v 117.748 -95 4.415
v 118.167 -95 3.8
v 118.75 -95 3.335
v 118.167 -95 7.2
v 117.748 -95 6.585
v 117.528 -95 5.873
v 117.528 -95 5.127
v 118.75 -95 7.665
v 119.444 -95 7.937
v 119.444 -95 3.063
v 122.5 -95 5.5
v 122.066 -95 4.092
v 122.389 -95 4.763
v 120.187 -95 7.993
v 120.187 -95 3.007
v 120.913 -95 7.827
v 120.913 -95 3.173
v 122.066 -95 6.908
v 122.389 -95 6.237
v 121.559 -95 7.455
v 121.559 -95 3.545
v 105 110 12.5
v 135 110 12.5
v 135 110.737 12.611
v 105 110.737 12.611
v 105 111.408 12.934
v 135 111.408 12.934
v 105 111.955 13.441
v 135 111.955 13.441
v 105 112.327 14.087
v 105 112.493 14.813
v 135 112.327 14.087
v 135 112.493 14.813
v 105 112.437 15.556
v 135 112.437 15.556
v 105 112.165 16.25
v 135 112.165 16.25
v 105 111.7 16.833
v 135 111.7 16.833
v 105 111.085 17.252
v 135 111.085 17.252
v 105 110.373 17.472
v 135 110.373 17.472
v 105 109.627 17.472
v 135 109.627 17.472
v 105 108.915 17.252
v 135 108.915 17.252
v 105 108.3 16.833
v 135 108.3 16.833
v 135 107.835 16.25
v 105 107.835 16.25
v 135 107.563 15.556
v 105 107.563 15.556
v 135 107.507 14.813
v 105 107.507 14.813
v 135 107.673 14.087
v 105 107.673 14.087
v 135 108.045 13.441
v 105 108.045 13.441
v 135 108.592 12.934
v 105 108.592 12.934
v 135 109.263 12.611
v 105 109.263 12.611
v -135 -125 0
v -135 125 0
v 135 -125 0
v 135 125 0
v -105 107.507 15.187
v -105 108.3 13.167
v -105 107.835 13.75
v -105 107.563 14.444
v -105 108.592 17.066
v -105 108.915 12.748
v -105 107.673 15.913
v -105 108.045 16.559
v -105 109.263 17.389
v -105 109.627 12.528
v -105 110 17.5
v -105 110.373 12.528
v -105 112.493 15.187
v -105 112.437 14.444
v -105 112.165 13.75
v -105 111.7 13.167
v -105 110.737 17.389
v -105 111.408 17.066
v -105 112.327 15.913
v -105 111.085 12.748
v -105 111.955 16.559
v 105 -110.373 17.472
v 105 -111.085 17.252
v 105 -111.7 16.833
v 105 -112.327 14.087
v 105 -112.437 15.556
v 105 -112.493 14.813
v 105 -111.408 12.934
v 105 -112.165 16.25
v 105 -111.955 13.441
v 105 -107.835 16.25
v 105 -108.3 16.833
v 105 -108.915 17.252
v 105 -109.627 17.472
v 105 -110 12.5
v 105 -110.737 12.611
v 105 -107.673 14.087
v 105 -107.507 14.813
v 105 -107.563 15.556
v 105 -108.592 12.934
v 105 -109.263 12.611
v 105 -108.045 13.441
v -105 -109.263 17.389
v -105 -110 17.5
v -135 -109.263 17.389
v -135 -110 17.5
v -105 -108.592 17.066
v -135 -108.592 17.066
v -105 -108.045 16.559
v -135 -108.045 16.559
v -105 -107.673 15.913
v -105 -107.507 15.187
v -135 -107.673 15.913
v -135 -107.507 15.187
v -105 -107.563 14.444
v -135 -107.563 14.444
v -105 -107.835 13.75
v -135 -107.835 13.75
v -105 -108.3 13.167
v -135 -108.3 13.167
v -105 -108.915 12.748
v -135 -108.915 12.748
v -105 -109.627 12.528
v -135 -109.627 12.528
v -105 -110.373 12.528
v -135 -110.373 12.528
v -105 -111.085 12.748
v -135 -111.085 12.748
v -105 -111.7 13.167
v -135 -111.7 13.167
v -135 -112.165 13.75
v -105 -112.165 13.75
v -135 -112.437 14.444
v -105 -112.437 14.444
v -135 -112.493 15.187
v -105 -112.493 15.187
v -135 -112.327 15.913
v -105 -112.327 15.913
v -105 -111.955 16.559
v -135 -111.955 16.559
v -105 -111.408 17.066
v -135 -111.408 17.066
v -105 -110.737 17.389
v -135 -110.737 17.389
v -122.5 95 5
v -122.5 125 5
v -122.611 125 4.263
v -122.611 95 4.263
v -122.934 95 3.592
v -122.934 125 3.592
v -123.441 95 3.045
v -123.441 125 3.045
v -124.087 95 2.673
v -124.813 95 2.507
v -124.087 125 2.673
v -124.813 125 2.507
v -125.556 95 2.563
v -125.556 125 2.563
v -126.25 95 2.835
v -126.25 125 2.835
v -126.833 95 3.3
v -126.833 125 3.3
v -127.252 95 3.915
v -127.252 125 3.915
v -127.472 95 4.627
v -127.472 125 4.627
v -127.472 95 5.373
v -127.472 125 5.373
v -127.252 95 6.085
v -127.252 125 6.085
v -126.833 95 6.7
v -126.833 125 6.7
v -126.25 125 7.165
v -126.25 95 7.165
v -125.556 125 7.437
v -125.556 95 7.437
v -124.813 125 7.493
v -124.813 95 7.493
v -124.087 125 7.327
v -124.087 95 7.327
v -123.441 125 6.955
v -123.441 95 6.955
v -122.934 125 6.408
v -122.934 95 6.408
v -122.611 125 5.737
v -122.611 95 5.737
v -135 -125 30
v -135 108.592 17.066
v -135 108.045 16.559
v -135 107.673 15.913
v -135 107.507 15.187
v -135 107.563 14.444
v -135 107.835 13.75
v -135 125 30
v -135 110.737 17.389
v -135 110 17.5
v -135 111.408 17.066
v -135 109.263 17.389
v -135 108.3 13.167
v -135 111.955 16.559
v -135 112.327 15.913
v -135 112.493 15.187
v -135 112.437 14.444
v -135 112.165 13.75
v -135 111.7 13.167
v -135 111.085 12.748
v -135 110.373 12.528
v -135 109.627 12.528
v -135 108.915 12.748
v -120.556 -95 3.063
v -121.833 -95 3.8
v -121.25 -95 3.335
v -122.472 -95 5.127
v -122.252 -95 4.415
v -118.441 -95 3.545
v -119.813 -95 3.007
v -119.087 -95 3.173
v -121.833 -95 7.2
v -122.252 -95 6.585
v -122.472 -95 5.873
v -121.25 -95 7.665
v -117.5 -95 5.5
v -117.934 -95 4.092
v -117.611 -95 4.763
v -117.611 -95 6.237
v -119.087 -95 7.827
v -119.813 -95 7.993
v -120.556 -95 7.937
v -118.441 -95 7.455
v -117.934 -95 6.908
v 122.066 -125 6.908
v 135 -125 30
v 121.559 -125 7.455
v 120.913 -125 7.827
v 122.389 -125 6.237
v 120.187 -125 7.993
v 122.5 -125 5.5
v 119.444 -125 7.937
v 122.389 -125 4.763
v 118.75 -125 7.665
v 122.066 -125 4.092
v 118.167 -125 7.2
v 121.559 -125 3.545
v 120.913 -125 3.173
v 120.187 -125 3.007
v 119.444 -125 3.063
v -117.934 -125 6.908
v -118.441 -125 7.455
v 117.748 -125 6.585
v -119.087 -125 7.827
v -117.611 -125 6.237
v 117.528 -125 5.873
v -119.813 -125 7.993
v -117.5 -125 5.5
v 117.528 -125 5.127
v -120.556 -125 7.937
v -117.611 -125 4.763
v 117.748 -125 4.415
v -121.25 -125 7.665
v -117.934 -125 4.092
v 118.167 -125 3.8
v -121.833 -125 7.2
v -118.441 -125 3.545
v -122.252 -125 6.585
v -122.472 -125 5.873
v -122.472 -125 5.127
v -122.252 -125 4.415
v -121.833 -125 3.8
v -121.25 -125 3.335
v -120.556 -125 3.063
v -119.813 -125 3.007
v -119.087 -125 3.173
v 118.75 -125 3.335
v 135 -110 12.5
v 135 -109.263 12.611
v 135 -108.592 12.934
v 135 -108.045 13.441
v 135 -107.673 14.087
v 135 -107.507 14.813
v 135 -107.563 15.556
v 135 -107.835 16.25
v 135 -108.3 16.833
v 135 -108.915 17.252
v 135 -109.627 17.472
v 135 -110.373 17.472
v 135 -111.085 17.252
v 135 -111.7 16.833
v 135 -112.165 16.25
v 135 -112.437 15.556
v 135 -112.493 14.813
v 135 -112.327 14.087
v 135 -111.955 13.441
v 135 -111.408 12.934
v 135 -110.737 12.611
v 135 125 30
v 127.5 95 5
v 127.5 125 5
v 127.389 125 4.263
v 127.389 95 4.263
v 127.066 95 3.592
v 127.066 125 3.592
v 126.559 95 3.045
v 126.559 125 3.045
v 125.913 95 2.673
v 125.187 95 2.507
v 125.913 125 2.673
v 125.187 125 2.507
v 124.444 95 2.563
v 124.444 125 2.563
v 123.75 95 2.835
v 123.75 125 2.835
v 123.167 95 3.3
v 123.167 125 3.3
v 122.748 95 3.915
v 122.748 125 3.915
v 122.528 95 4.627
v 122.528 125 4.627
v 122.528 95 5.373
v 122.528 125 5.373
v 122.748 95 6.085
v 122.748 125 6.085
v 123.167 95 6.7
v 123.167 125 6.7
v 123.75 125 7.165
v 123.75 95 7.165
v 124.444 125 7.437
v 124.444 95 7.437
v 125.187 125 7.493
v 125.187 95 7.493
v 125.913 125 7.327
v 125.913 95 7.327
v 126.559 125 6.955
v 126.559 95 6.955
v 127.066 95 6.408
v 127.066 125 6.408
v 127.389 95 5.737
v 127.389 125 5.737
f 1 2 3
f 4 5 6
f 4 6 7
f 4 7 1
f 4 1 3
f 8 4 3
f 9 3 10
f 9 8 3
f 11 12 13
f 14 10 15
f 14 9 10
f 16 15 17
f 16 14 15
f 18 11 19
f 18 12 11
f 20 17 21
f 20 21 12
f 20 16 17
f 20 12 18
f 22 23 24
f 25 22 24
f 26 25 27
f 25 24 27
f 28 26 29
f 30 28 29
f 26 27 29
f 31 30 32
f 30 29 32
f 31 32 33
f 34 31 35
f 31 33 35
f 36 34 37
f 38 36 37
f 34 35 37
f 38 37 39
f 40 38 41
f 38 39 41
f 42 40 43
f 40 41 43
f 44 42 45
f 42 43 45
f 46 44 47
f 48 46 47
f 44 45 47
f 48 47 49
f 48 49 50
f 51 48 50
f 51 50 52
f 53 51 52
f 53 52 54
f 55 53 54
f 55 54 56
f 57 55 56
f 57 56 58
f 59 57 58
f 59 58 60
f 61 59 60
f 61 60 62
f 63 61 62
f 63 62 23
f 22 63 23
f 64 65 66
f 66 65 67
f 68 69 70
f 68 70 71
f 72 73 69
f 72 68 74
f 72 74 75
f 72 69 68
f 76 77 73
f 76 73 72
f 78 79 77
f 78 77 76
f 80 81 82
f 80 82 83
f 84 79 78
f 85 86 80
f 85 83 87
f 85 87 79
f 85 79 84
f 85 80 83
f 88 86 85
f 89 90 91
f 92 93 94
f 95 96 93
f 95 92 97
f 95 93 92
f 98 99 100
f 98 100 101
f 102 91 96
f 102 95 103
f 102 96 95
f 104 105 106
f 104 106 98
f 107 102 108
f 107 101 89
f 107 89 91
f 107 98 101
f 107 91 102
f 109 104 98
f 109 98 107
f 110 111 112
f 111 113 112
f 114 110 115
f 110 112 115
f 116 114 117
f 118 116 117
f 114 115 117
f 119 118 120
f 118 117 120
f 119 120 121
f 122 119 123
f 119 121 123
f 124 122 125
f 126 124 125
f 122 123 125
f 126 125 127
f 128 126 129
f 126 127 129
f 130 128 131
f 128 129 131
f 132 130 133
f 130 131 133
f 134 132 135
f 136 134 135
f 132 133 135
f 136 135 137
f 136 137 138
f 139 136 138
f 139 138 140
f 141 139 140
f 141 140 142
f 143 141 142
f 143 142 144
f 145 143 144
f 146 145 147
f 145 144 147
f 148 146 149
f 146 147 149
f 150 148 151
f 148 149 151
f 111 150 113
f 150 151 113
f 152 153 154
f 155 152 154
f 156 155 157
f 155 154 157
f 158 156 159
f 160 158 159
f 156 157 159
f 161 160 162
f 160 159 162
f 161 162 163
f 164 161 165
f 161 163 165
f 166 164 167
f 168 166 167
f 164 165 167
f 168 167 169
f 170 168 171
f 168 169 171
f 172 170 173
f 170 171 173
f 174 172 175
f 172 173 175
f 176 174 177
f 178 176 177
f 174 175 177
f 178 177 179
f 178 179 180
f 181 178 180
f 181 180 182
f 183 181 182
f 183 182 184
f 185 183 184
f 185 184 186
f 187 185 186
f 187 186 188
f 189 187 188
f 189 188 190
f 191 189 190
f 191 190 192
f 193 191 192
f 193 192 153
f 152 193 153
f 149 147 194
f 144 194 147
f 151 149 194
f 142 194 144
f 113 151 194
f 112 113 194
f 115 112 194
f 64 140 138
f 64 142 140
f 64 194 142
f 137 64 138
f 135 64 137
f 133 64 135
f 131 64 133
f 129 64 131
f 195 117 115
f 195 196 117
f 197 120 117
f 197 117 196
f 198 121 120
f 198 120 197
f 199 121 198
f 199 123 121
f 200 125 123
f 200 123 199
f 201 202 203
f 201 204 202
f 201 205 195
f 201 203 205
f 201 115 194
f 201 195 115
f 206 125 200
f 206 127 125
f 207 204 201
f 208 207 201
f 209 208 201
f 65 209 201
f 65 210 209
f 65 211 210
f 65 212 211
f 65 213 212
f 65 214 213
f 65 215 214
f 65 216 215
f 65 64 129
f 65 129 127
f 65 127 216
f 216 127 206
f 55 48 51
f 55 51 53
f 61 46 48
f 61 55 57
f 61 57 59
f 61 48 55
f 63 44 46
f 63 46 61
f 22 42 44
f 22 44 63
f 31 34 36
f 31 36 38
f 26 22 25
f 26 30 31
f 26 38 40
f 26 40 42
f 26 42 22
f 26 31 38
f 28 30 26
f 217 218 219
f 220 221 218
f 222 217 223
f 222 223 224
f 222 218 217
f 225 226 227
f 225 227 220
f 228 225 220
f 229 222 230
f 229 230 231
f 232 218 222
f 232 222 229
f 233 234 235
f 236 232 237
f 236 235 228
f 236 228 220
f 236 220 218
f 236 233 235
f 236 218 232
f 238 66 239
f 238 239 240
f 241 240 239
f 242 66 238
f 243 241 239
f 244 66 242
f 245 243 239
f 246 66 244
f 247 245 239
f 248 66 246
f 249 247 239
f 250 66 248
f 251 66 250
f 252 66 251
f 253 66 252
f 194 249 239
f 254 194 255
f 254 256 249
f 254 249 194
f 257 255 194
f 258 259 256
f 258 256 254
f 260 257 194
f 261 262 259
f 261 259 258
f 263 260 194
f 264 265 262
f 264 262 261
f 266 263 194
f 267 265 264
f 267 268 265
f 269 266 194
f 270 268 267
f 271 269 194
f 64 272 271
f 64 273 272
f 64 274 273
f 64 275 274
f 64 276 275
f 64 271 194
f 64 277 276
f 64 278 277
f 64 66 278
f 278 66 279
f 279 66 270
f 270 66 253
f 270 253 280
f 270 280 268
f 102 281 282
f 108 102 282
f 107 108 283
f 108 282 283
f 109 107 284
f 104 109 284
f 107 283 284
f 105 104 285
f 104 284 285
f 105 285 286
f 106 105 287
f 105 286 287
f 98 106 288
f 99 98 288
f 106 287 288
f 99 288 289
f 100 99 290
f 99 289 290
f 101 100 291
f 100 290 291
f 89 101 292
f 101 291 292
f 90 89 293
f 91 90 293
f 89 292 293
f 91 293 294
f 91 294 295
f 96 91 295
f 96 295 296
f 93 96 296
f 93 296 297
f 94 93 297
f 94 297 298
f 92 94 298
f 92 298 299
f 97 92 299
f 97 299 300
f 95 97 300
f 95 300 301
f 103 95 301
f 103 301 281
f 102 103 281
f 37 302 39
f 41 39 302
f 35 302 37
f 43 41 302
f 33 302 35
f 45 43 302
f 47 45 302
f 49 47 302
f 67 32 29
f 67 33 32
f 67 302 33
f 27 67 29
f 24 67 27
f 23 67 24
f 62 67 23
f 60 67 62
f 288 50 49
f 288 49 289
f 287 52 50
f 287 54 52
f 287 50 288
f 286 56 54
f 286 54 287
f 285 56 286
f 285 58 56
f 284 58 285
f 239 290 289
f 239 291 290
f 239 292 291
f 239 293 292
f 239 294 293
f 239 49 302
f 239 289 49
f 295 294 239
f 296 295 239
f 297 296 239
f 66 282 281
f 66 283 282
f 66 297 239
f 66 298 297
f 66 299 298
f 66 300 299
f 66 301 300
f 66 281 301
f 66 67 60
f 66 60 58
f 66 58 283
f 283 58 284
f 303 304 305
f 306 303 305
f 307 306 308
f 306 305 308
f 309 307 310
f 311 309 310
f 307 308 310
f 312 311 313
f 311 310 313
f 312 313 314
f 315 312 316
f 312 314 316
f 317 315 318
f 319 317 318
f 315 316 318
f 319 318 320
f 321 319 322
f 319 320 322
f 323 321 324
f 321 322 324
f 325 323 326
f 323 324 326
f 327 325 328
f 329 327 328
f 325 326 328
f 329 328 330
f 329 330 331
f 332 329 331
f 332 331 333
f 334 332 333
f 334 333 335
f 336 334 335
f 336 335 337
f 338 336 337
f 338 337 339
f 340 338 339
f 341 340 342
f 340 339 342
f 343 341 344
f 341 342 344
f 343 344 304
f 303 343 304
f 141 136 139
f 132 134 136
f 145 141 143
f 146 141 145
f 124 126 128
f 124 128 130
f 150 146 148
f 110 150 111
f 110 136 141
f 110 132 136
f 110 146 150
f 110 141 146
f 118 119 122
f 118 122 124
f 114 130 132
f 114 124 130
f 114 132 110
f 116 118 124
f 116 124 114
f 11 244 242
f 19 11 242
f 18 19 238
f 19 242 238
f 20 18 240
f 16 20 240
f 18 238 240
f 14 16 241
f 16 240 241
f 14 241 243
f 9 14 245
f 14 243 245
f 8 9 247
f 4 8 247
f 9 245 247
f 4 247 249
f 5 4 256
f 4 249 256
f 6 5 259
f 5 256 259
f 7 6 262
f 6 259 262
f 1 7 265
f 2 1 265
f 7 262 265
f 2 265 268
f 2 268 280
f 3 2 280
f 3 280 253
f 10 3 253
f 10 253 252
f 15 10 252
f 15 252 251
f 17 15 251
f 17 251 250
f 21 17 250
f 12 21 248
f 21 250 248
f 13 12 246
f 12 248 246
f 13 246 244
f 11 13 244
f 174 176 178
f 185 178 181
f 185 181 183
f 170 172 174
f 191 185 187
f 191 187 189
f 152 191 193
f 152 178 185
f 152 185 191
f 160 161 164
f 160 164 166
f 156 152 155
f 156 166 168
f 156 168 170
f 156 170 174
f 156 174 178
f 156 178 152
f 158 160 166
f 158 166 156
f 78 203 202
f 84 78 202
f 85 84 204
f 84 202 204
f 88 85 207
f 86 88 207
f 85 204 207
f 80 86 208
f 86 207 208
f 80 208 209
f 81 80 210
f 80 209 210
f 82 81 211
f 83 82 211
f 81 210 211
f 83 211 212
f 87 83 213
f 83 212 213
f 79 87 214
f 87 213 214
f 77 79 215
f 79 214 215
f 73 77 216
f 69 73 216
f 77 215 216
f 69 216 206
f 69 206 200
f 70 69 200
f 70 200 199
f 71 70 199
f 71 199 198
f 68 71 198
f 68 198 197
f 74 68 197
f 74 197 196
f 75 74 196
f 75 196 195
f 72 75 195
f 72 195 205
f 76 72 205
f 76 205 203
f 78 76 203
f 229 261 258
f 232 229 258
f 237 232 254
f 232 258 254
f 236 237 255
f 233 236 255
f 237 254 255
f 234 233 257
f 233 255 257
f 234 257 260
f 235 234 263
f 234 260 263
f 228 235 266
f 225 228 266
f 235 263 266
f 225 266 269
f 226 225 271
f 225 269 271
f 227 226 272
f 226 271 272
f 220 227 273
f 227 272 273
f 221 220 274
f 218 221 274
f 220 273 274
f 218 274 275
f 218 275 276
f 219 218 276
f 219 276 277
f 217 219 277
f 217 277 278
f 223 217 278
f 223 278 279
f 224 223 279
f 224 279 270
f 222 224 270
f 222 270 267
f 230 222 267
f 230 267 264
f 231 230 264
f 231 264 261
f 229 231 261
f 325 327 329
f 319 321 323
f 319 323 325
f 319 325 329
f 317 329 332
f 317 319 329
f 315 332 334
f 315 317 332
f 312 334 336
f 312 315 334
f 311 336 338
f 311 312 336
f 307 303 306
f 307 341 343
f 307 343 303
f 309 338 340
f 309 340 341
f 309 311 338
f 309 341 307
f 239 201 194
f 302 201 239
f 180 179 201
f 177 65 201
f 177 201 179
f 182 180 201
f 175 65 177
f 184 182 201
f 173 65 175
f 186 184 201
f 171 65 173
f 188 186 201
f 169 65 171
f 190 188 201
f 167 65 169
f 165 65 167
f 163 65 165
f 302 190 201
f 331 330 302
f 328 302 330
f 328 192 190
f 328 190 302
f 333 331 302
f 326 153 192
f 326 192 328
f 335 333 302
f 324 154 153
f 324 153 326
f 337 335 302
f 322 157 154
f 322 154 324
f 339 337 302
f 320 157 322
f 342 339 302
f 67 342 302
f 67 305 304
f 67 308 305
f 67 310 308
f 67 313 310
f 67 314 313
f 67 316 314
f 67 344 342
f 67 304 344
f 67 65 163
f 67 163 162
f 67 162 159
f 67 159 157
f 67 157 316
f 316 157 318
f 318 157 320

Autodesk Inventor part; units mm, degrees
ref_plane "YZ Plane" through (0, 0, 0) normal (1, 0, 0) x (0, 1, 0)
ref_plane "XZ Plane" through (0, 0, 0) normal (0, 1, 0) x (-1, 0, 0)
ref_plane "XY Plane" through (0, 0, 0) normal (0, 0, 1) x (1, 0, 0)
sketch "스케치1" plane through (0, 0, 0) normal (0, 0, 1) x (1, 0, 0)
  line L0 (135, -125) -> (-135, -125)
  line L1 (-135, -125) -> (-135, 125)
  line L2 (-135, 125) -> (135, 125)
  line L3 (135, 125) -> (135, -125)
  line L4 (135, -125) -> (-135, 125) construction
  line L5 (-135, -125) -> (135, 125) construction
  point P0 (0, 0)
  dimension "d0" = 270
  dimension "d1" = 250
extrude "돌출1" add sketch "스케치1" along normal blind 30
sketch "스케치2" plane through (-135, -125, 0) normal (0, -1, 0) x (1, 0, 0)
  circle A0 centre (15, 5.5) radius 2.5
  line L0 (270, 0) -> (0, 0) projected
  circle A1 centre (255, 5.5) radius 2.5
  line L1 (0, 0) -> (0, 30) projected
  line L2 (270, 0) -> (270, 30) projected
  point P0 (135, 0)
  dimension "d4" = 5
  dimension "d6" = 3
  dimension "d7" = 5
  dimension "d8" = 15
  dimension "d9" = 15
extrude "돌출2" cut sketch "스케치2" against normal blind 30
sketch "스케치3" plane through (-135, -125, 0) normal (-1, 0, 0) x (0, 0, 1)
  circle A0 centre (15, 235) radius 2.5
  circle A1 centre (15, 15) radius 2.5
  line L0 (0, 0) -> (30, 0) projected
  line L1 (0, 0) -> (0, 250) projected
  line L2 (0, 250) -> (30, 250) projected
  point P0 (0, 125)
  dimension "d12" = 5
  dimension "d13" = 5
  dimension "d14" = 15
  dimension "d15" = 15
  dimension "d16" = 15
  dimension "d17" = 15
extrude "돌출3" cut sketch "스케치3" against normal blind 30
sketch "스케치4" plane through (-135, 125, 0) normal (0, 1, 0) x (1, 0, 0)
  circle A0 centre (260, -5) radius 2.5
  circle A1 centre (10, -5) radius 2.5
  line L0 (0, 0) -> (270, 0) projected
  line L1 (270, 0) -> (270, -30) projected
  line L2 (0, 0) -> (0, -30) projected
  point P0 (135, 0)
  dimension "d20" = 5
  dimension "d21" = 5
  dimension "d22" = 5
  dimension "d23" = 10
  dimension "d24" = 10
  dimension "d25" = 5
extrude "돌출4" cut sketch "스케치4" against normal blind 30
sketch "스케치5" plane through (135, -125, 0) normal (1, 0, 0) x (0, 0, -1)
  circle A0 centre (-15, 15) radius 2.5 projected
  circle A1 centre (-15, 15) radius 2.5
  circle A2 centre (-15, 235) radius 2.5 projected
  circle A3 centre (-15, 235) radius 2.5
  point P0 (0, 125)
  dimension "d28" = 5
  dimension "d29" = 5
extrude "돌출5" cut sketch "스케치5" against normal blind 30 contours A2
extrude "돌출6" cut sketch "스케치5" against normal blind 30 contours A0
properties part number "240626_tablep1"
